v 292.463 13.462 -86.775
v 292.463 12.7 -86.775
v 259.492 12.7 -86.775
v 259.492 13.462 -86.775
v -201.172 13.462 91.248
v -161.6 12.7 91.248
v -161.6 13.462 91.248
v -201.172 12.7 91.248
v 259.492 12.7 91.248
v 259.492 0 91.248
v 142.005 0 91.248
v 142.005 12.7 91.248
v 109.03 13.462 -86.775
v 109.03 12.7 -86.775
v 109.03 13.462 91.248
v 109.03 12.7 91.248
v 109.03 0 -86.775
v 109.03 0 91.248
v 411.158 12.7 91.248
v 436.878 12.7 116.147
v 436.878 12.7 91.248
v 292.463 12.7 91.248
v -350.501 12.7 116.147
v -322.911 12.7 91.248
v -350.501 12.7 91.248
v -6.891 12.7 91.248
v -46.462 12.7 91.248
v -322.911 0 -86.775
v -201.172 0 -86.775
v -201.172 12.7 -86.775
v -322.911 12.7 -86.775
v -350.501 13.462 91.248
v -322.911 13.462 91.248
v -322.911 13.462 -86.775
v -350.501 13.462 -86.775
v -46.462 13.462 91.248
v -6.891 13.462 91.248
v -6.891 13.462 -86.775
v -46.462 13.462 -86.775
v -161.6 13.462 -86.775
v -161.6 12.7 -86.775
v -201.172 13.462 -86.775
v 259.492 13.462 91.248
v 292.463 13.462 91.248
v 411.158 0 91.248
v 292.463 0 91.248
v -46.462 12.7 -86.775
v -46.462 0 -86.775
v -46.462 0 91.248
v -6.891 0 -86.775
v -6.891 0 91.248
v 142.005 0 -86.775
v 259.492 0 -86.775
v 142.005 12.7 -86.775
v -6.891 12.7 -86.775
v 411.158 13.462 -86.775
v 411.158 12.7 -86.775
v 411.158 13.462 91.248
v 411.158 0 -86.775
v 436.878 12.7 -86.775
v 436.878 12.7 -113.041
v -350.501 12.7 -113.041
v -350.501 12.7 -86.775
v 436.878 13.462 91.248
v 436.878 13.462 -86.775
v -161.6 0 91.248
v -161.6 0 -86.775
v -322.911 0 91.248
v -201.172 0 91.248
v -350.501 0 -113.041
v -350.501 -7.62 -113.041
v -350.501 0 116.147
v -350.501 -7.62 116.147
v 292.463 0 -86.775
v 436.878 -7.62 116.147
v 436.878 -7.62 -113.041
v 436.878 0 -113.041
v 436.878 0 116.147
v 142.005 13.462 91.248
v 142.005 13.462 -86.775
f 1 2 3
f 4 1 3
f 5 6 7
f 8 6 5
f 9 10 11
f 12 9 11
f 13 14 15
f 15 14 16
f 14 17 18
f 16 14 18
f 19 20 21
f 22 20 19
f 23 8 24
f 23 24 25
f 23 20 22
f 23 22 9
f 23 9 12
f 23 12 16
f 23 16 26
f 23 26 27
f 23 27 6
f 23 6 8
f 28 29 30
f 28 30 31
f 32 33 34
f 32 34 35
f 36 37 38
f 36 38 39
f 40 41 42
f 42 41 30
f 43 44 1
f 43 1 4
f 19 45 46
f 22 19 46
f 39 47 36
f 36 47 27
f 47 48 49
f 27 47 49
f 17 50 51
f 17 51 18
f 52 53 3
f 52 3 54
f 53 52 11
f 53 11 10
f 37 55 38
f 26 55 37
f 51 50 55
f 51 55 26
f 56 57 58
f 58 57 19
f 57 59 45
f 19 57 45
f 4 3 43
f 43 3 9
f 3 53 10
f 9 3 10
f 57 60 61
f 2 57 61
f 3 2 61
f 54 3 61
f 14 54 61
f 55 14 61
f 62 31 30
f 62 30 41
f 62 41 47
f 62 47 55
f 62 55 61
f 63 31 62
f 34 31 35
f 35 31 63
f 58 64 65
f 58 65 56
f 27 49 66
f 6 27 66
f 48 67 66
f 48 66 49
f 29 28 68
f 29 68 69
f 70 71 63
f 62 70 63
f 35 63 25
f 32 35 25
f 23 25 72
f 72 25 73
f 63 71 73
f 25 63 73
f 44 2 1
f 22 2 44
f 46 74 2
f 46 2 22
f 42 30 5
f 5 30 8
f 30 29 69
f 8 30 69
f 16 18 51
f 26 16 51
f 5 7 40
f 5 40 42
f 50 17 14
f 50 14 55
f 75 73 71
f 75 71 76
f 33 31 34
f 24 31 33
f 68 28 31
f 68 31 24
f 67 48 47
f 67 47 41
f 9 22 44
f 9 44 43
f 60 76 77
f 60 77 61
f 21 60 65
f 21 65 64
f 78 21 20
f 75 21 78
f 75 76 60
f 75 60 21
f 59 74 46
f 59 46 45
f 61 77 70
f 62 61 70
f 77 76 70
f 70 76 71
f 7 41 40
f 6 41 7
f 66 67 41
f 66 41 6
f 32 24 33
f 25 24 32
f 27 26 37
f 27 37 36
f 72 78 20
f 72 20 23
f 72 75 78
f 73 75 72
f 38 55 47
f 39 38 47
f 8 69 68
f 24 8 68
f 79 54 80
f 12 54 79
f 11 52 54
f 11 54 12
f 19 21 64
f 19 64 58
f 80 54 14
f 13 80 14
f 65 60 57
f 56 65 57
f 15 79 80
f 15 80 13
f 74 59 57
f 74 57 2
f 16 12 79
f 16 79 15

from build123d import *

# Parameters (mm, degrees)
F0_W      = 787.3788177967
F0_H      = 229.1885906598
F1_DEPTH  = 7.62
F2_W      = 787.3788177967
F2_H      = 24.8994113645
F3_DEPTH  = 12.7
F4_W      = 787.3788177967
F4_H      = 26.2663476169
F5_DEPTH  = 12.7
F6_W      = 25.7195234299
F6_H      = 178.0228316784
F7_DEPTH  = 13.462
F8_W      = 27.5898575783
F8_H      = 178.0228316784
F9_DEPTH  = 13.462
F10_W     = 32.9714715481
F10_H     = 178.0228316784
F11_DEPTH = 13.462
F12_W     = 32.9747404903
F12_H     = 178.0228316784
F13_DEPTH = 13.462
F14_W     = 39.5713537
F14_H     = 178.0228316784
F15_DEPTH = 13.462
F16_W     = 39.5713876933
F16_H     = 178.0228316784
F17_DEPTH = 13.462


with BuildPart() as f1:
    # F0 (on Front) → F1 (new body)
    with BuildSketch(Plane.XZ):
        with Locations((43.1885272264, 1.5531365643)):
            Rectangle(F0_W, F0_H)
    extrude(amount=F1_DEPTH)

    # F2 (on face) → F3 (join)
    with BuildSketch(Plane(origin=(0, 0, 0), x_dir=(-1, 0, 0), z_dir=(0, 1, 0))):
        with Locations((-43.1885272264, 103.697726212)):
            Rectangle(F2_W, F2_H)
    extrude(amount=F3_DEPTH)

    # F4 (on face) → F5 (join)
    with BuildSketch(Plane(origin=(0, 0, 0), x_dir=(-1, 0, 0), z_dir=(0, 1, 0))):
        with Locations((-43.1885272264, -99.9079849571)):
            Rectangle(F4_W, F4_H)
    extrude(amount=F5_DEPTH)

    # F6 (on face) → F7 (join)
    with BuildSketch(Plane(origin=(0, 0, 0), x_dir=(-1, 0, 0), z_dir=(0, 1, 0))):
        with Locations((-424.0181744099, 2.2366046906)):
            Rectangle(F6_W, F6_H)
    extrude(amount=F7_DEPTH)

    # F8 (on face) → F9 (join)
    with BuildSketch(Plane(origin=(0, 0, 0), x_dir=(-1, 0, 0), z_dir=(0, 1, 0))):
        with Locations((336.7059528828, 2.2366046906)):
            Rectangle(F8_W, F8_H)
    extrude(amount=F9_DEPTH)

    # F10 (on face) → F11 (join)
    with BuildSketch(Plane(origin=(0, 0, 0), x_dir=(-1, 0, 0), z_dir=(0, 1, 0))):
        with Locations((-275.9774178267, 2.2366046906)):
            Rectangle(F10_W, F10_H)
    extrude(amount=F11_DEPTH)

    # F12 (on face) → F13 (join)
    with BuildSketch(Plane(origin=(0, 0, 0), x_dir=(-1, 0, 0), z_dir=(0, 1, 0))):
        with Locations((-125.517684035, 2.2366046906)):
            Rectangle(F12_W, F12_H)
    extrude(amount=F13_DEPTH)

    # F14 (on face) → F15 (join)
    with BuildSketch(Plane(origin=(0, 0, 0), x_dir=(-1, 0, 0), z_dir=(0, 1, 0))):
        with Locations((26.6765605193, 2.2366046906)):
            Rectangle(F14_W, F14_H)
    extrude(amount=F15_DEPTH)

    # F16 (on face) → F17 (join)
    with BuildSketch(Plane(origin=(0, 0, 0), x_dir=(-1, 0, 0), z_dir=(0, 1, 0))):
        with Locations((181.3858910464, 2.2366046906)):
            Rectangle(F16_W, F16_H)
    extrude(amount=F17_DEPTH)


solid = f1.part
